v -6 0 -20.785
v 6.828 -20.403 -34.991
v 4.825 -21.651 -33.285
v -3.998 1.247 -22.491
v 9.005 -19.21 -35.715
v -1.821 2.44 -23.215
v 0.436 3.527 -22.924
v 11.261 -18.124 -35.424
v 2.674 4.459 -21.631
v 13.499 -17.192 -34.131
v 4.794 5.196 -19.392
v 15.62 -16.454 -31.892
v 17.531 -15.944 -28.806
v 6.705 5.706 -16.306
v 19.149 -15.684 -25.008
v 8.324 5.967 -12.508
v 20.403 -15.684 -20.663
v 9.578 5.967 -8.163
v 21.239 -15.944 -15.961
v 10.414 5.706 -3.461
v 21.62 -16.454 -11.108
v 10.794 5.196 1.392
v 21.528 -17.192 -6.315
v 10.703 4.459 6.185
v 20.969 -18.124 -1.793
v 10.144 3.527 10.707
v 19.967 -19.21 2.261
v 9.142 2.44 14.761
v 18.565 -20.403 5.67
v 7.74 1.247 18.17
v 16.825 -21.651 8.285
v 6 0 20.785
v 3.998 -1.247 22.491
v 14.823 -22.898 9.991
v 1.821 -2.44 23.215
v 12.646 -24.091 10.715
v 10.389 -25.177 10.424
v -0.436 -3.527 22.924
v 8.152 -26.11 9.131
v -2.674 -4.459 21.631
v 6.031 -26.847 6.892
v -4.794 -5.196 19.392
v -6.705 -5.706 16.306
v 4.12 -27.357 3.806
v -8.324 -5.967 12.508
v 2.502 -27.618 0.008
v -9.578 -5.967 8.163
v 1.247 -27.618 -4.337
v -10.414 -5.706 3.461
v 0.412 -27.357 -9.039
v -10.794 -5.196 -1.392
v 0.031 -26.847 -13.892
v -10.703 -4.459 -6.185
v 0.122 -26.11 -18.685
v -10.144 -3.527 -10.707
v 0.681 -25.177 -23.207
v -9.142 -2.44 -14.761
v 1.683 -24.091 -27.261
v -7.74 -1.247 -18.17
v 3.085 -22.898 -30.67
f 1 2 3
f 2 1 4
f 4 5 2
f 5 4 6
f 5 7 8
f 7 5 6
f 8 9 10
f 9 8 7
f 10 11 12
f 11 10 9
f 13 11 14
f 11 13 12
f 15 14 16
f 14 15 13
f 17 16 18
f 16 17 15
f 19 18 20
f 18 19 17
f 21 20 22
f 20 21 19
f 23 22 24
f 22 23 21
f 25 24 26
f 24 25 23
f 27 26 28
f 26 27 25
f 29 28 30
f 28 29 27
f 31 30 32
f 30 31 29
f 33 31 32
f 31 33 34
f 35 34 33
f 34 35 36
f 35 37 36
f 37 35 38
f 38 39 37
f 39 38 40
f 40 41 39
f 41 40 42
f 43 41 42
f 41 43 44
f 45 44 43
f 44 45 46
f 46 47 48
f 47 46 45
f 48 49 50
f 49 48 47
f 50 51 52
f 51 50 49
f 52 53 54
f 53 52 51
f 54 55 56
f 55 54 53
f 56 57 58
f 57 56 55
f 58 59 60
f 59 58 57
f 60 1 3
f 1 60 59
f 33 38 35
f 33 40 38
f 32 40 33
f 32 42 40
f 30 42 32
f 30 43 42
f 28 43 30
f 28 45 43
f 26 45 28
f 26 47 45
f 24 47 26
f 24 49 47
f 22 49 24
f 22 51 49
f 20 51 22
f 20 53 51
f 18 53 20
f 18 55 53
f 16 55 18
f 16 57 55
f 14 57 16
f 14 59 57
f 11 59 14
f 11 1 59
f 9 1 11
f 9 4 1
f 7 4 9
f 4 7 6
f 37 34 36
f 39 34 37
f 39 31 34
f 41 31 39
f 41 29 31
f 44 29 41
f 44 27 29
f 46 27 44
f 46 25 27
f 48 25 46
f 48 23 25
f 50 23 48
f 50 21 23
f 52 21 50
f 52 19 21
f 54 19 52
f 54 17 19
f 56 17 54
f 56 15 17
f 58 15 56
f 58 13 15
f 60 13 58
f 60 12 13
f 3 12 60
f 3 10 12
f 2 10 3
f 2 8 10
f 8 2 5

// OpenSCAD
// Generated by generate_scads.py
scale([1.0,1.0,2.0]) {
  rotate([60,120,0]) {
    union() {
      cylinder(h=25, r=12, center=false);
    }
  }
}
